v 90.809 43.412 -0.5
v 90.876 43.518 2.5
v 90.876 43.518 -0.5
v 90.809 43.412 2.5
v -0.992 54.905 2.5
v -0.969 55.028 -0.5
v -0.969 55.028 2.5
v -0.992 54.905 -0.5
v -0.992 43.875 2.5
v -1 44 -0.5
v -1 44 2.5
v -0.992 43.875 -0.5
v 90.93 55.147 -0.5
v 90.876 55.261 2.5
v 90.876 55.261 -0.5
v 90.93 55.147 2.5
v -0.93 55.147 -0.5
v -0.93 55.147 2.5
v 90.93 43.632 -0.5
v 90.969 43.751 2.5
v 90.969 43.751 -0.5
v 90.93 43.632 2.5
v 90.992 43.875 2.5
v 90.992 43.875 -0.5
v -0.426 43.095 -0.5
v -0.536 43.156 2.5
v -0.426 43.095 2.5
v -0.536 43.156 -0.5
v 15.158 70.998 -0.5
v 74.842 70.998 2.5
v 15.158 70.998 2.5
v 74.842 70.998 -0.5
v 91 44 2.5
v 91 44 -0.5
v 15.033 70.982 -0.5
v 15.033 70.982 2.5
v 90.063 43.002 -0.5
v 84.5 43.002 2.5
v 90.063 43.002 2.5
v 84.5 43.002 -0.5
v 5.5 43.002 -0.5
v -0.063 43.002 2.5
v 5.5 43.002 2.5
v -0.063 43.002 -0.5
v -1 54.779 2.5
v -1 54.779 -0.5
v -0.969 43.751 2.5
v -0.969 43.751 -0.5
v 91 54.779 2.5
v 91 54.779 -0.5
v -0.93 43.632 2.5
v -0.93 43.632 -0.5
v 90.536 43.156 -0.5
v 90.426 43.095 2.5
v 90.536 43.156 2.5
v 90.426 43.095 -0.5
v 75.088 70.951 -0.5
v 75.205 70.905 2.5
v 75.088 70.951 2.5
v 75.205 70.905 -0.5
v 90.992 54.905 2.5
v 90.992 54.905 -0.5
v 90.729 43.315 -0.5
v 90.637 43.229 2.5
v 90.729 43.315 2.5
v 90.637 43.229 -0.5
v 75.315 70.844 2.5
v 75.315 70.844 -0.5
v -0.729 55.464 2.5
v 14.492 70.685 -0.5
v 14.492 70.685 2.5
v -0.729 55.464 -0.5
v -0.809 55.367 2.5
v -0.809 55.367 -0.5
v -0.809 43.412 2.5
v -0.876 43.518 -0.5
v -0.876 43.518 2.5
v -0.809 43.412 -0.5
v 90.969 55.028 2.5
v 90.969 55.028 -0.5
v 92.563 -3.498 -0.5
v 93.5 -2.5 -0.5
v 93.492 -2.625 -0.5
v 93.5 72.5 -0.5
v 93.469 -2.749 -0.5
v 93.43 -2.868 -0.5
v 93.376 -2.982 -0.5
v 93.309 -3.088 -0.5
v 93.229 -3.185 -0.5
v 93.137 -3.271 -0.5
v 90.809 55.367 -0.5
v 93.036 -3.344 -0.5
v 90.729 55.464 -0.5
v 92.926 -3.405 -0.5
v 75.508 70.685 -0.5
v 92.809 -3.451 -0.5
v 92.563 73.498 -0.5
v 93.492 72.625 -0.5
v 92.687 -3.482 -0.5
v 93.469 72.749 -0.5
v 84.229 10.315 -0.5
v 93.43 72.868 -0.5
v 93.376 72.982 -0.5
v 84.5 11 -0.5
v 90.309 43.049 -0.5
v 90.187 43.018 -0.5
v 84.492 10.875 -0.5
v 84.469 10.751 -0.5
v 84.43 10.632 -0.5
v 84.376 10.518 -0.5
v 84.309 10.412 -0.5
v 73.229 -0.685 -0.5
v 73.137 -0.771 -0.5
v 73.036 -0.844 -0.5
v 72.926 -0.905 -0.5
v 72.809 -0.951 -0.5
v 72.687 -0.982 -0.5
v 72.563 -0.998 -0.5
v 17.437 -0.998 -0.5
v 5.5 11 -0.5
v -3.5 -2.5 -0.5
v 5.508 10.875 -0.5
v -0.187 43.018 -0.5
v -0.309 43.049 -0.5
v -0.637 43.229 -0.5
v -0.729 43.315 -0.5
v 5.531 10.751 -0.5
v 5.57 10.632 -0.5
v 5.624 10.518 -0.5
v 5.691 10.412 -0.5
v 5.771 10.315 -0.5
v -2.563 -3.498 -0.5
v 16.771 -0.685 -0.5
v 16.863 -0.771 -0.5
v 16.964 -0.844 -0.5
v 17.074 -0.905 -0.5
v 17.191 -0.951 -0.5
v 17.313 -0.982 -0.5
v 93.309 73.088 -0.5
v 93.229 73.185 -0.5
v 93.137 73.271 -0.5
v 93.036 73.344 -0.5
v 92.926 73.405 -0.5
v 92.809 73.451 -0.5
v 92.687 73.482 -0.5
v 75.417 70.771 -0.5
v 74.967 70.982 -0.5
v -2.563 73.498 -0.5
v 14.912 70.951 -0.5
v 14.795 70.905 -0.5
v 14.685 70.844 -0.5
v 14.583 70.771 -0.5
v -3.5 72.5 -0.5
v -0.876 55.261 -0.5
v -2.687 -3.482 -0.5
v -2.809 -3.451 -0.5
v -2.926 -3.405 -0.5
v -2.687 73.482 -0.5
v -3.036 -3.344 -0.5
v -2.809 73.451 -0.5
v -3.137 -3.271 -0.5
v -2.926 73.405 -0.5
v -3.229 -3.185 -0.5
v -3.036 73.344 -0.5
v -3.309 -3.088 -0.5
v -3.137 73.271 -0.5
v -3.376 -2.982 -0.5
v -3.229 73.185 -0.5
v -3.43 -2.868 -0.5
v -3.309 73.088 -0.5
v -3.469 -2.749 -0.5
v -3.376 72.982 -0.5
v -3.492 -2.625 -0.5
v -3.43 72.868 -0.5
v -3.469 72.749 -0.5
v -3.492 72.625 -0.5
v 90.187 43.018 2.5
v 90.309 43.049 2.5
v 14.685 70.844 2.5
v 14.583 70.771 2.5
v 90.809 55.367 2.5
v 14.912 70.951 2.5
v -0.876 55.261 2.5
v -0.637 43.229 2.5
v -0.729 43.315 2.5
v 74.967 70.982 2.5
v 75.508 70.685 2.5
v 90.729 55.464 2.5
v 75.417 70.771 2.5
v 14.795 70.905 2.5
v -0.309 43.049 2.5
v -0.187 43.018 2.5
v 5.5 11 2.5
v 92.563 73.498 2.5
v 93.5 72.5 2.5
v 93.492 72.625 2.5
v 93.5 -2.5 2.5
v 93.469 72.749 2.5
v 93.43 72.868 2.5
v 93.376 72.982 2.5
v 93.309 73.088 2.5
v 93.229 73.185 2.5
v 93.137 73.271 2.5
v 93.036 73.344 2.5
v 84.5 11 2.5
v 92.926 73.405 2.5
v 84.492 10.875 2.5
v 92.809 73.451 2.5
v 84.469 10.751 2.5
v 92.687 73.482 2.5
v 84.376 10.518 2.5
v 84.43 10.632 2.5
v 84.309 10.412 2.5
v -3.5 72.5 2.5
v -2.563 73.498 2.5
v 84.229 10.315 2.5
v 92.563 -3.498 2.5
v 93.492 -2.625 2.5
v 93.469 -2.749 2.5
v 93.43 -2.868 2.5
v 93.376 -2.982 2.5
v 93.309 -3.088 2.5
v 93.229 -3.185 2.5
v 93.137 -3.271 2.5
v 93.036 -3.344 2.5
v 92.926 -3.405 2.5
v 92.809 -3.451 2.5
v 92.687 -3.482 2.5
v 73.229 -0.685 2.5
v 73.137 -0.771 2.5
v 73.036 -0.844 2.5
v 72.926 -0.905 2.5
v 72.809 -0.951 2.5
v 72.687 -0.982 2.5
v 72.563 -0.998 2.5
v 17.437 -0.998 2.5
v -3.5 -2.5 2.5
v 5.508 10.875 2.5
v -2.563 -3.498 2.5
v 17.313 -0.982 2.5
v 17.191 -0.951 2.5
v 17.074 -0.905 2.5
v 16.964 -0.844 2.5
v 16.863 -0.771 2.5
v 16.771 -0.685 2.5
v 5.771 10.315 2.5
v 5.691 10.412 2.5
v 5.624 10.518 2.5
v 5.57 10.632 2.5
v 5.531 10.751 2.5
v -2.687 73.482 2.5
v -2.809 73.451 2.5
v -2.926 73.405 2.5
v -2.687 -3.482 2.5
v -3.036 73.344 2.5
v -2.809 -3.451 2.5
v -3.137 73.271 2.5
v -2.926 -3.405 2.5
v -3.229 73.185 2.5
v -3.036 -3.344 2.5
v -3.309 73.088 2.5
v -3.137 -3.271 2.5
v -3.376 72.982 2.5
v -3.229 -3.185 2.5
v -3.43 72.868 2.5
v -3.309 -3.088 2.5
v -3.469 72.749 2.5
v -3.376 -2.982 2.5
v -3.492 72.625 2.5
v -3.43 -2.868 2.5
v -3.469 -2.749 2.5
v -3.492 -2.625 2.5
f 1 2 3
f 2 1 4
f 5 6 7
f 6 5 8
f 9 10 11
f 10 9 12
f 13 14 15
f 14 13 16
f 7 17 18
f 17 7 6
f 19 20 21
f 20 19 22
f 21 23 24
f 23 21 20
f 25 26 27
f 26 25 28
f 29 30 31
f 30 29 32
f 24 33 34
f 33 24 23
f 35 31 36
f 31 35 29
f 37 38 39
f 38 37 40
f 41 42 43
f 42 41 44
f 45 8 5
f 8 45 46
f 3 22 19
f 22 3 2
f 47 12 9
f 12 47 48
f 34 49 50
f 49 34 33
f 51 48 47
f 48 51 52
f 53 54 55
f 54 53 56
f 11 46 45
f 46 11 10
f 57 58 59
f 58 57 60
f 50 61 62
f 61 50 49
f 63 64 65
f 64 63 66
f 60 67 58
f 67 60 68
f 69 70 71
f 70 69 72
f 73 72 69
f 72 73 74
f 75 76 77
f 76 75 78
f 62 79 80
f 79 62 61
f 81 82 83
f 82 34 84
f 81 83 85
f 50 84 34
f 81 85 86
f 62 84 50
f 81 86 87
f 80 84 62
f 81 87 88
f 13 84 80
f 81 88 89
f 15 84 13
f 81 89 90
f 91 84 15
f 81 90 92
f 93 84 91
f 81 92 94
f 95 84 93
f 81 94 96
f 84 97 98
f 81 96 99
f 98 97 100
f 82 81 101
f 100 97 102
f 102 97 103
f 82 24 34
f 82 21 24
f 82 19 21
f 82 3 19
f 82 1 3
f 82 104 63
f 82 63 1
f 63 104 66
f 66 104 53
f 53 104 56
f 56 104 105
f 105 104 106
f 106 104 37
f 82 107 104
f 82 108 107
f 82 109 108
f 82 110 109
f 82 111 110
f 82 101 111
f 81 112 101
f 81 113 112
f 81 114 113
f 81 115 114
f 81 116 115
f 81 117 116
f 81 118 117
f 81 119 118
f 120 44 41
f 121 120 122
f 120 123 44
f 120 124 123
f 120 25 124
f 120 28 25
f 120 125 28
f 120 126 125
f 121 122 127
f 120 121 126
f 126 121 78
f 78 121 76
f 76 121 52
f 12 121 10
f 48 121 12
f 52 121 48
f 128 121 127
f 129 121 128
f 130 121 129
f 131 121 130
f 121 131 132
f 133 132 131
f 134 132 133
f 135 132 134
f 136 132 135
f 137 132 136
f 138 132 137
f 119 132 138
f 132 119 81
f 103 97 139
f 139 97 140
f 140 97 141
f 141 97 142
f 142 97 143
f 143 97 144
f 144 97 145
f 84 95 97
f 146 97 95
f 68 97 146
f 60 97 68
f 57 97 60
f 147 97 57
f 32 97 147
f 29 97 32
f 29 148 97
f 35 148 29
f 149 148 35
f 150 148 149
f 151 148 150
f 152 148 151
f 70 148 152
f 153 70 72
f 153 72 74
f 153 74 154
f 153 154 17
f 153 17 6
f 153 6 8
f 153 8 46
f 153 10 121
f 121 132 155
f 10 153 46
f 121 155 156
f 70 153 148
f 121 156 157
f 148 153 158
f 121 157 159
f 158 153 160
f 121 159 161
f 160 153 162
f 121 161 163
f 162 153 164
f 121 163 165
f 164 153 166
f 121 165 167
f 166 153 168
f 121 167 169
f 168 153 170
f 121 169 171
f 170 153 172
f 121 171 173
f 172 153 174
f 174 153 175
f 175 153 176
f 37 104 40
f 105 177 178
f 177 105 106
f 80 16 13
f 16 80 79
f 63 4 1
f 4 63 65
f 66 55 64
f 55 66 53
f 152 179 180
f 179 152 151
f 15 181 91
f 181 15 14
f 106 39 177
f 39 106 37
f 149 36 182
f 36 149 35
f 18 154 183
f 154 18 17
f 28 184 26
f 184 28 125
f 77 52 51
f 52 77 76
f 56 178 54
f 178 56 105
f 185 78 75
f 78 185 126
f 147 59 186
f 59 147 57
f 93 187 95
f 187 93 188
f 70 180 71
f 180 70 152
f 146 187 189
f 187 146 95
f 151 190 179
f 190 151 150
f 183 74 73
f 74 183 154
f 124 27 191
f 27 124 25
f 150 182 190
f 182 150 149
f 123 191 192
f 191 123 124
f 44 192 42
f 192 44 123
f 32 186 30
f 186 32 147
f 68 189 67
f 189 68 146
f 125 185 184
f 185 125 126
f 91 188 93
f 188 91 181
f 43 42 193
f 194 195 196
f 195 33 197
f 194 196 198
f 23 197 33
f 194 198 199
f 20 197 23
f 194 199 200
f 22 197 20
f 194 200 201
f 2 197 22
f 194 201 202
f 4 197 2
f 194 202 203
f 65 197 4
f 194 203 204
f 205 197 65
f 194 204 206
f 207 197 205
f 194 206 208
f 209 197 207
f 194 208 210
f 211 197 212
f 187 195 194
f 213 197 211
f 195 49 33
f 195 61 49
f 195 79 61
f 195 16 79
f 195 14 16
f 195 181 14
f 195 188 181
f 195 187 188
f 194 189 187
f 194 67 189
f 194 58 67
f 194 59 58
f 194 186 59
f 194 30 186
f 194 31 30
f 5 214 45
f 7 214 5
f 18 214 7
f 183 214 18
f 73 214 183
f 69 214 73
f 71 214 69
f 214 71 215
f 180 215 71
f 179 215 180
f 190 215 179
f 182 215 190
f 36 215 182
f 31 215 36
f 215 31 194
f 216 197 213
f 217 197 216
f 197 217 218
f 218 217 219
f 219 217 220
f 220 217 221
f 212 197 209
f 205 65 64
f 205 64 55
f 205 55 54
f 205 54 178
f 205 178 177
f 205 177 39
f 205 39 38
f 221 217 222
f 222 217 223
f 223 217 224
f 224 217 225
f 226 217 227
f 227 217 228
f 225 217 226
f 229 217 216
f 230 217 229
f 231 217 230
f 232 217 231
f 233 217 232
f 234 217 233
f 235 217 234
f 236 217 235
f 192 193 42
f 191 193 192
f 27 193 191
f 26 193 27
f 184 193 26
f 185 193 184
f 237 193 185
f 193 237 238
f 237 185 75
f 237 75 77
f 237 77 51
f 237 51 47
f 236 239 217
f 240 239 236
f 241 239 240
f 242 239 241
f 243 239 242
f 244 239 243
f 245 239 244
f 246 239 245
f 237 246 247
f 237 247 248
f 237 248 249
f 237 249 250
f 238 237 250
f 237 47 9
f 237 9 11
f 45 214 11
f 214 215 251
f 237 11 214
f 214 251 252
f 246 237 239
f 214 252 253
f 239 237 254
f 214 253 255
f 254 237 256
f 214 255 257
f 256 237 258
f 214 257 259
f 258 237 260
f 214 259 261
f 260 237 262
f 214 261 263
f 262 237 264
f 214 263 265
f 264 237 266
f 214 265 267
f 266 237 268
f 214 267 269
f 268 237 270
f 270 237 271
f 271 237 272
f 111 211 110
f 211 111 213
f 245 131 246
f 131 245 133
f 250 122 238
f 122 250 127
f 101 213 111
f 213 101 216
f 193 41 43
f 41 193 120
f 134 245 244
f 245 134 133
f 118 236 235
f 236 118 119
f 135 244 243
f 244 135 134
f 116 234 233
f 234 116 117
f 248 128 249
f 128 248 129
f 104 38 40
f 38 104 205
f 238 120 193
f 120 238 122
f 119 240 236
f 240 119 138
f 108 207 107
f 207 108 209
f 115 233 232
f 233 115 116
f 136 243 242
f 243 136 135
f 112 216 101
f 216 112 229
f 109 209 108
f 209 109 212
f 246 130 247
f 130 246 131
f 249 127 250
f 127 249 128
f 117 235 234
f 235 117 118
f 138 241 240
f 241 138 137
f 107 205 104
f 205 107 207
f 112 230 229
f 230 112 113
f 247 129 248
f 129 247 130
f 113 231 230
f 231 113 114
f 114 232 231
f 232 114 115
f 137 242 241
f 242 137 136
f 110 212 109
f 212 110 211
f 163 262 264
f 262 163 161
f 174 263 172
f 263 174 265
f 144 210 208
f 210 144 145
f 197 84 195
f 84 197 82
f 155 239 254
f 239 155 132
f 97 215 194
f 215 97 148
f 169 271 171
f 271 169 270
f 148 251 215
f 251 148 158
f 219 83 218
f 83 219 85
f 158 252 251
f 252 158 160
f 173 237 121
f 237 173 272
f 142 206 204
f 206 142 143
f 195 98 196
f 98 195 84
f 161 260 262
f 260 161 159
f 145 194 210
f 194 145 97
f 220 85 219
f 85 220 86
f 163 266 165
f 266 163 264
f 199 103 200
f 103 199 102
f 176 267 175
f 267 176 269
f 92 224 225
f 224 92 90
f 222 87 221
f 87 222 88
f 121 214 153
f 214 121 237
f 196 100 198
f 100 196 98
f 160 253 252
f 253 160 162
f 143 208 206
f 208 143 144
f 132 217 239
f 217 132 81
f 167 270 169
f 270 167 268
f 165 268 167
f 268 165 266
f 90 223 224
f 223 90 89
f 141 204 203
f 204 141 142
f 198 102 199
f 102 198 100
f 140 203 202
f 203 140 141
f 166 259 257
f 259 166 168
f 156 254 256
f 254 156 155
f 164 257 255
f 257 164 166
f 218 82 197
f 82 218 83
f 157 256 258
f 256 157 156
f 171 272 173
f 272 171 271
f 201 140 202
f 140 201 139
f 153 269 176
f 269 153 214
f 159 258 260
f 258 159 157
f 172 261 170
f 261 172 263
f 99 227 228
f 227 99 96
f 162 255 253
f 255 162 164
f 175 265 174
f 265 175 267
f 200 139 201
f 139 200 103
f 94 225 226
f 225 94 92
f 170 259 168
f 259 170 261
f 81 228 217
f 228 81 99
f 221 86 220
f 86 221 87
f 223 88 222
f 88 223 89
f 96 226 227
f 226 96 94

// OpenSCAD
$fn=50;

batteryWidth = 90;
batteryHeight = 70;
bottomSupportHeight = 2;
coverHeight = 26;
coverDepth = 6.5;
frameThickness=5;


module storageGap() {
minkowski() {
    intersection() {
        difference() {
            cube(size = [batteryWidth,batteryHeight,bottomSupportHeight]);
            color("blue",0.5) 
                    cube(size=[coverDepth, batteryHeight-coverHeight, bottomSupportHeight+1]);
            translate([(batteryWidth - coverDepth), 0, 0]) {
                color("blue",0.5) 
                    cube(size=[coverDepth, batteryHeight-coverHeight, bottomSupportHeight+1]);
            }
        }
        translate([batteryWidth / 2, -batteryHeight / 2+7.5, 0]) 
            color("green", 0.5)
                rotate([0,0,45])
                    cube(size = [batteryWidth,batteryWidth,bottomSupportHeight]);
        }
    cylinder(1, center=true);
}
}

module storageFrame() {
minkowski() {
    translate([-frameThickness / 2, -frameThickness / 2, 0])
        color("red", 0.5)
            cube([batteryWidth + frameThickness, batteryHeight + frameThickness, bottomSupportHeight]);
    cylinder(1, center=true);
}
}

difference() {
    storageFrame();
    storageGap();
}
